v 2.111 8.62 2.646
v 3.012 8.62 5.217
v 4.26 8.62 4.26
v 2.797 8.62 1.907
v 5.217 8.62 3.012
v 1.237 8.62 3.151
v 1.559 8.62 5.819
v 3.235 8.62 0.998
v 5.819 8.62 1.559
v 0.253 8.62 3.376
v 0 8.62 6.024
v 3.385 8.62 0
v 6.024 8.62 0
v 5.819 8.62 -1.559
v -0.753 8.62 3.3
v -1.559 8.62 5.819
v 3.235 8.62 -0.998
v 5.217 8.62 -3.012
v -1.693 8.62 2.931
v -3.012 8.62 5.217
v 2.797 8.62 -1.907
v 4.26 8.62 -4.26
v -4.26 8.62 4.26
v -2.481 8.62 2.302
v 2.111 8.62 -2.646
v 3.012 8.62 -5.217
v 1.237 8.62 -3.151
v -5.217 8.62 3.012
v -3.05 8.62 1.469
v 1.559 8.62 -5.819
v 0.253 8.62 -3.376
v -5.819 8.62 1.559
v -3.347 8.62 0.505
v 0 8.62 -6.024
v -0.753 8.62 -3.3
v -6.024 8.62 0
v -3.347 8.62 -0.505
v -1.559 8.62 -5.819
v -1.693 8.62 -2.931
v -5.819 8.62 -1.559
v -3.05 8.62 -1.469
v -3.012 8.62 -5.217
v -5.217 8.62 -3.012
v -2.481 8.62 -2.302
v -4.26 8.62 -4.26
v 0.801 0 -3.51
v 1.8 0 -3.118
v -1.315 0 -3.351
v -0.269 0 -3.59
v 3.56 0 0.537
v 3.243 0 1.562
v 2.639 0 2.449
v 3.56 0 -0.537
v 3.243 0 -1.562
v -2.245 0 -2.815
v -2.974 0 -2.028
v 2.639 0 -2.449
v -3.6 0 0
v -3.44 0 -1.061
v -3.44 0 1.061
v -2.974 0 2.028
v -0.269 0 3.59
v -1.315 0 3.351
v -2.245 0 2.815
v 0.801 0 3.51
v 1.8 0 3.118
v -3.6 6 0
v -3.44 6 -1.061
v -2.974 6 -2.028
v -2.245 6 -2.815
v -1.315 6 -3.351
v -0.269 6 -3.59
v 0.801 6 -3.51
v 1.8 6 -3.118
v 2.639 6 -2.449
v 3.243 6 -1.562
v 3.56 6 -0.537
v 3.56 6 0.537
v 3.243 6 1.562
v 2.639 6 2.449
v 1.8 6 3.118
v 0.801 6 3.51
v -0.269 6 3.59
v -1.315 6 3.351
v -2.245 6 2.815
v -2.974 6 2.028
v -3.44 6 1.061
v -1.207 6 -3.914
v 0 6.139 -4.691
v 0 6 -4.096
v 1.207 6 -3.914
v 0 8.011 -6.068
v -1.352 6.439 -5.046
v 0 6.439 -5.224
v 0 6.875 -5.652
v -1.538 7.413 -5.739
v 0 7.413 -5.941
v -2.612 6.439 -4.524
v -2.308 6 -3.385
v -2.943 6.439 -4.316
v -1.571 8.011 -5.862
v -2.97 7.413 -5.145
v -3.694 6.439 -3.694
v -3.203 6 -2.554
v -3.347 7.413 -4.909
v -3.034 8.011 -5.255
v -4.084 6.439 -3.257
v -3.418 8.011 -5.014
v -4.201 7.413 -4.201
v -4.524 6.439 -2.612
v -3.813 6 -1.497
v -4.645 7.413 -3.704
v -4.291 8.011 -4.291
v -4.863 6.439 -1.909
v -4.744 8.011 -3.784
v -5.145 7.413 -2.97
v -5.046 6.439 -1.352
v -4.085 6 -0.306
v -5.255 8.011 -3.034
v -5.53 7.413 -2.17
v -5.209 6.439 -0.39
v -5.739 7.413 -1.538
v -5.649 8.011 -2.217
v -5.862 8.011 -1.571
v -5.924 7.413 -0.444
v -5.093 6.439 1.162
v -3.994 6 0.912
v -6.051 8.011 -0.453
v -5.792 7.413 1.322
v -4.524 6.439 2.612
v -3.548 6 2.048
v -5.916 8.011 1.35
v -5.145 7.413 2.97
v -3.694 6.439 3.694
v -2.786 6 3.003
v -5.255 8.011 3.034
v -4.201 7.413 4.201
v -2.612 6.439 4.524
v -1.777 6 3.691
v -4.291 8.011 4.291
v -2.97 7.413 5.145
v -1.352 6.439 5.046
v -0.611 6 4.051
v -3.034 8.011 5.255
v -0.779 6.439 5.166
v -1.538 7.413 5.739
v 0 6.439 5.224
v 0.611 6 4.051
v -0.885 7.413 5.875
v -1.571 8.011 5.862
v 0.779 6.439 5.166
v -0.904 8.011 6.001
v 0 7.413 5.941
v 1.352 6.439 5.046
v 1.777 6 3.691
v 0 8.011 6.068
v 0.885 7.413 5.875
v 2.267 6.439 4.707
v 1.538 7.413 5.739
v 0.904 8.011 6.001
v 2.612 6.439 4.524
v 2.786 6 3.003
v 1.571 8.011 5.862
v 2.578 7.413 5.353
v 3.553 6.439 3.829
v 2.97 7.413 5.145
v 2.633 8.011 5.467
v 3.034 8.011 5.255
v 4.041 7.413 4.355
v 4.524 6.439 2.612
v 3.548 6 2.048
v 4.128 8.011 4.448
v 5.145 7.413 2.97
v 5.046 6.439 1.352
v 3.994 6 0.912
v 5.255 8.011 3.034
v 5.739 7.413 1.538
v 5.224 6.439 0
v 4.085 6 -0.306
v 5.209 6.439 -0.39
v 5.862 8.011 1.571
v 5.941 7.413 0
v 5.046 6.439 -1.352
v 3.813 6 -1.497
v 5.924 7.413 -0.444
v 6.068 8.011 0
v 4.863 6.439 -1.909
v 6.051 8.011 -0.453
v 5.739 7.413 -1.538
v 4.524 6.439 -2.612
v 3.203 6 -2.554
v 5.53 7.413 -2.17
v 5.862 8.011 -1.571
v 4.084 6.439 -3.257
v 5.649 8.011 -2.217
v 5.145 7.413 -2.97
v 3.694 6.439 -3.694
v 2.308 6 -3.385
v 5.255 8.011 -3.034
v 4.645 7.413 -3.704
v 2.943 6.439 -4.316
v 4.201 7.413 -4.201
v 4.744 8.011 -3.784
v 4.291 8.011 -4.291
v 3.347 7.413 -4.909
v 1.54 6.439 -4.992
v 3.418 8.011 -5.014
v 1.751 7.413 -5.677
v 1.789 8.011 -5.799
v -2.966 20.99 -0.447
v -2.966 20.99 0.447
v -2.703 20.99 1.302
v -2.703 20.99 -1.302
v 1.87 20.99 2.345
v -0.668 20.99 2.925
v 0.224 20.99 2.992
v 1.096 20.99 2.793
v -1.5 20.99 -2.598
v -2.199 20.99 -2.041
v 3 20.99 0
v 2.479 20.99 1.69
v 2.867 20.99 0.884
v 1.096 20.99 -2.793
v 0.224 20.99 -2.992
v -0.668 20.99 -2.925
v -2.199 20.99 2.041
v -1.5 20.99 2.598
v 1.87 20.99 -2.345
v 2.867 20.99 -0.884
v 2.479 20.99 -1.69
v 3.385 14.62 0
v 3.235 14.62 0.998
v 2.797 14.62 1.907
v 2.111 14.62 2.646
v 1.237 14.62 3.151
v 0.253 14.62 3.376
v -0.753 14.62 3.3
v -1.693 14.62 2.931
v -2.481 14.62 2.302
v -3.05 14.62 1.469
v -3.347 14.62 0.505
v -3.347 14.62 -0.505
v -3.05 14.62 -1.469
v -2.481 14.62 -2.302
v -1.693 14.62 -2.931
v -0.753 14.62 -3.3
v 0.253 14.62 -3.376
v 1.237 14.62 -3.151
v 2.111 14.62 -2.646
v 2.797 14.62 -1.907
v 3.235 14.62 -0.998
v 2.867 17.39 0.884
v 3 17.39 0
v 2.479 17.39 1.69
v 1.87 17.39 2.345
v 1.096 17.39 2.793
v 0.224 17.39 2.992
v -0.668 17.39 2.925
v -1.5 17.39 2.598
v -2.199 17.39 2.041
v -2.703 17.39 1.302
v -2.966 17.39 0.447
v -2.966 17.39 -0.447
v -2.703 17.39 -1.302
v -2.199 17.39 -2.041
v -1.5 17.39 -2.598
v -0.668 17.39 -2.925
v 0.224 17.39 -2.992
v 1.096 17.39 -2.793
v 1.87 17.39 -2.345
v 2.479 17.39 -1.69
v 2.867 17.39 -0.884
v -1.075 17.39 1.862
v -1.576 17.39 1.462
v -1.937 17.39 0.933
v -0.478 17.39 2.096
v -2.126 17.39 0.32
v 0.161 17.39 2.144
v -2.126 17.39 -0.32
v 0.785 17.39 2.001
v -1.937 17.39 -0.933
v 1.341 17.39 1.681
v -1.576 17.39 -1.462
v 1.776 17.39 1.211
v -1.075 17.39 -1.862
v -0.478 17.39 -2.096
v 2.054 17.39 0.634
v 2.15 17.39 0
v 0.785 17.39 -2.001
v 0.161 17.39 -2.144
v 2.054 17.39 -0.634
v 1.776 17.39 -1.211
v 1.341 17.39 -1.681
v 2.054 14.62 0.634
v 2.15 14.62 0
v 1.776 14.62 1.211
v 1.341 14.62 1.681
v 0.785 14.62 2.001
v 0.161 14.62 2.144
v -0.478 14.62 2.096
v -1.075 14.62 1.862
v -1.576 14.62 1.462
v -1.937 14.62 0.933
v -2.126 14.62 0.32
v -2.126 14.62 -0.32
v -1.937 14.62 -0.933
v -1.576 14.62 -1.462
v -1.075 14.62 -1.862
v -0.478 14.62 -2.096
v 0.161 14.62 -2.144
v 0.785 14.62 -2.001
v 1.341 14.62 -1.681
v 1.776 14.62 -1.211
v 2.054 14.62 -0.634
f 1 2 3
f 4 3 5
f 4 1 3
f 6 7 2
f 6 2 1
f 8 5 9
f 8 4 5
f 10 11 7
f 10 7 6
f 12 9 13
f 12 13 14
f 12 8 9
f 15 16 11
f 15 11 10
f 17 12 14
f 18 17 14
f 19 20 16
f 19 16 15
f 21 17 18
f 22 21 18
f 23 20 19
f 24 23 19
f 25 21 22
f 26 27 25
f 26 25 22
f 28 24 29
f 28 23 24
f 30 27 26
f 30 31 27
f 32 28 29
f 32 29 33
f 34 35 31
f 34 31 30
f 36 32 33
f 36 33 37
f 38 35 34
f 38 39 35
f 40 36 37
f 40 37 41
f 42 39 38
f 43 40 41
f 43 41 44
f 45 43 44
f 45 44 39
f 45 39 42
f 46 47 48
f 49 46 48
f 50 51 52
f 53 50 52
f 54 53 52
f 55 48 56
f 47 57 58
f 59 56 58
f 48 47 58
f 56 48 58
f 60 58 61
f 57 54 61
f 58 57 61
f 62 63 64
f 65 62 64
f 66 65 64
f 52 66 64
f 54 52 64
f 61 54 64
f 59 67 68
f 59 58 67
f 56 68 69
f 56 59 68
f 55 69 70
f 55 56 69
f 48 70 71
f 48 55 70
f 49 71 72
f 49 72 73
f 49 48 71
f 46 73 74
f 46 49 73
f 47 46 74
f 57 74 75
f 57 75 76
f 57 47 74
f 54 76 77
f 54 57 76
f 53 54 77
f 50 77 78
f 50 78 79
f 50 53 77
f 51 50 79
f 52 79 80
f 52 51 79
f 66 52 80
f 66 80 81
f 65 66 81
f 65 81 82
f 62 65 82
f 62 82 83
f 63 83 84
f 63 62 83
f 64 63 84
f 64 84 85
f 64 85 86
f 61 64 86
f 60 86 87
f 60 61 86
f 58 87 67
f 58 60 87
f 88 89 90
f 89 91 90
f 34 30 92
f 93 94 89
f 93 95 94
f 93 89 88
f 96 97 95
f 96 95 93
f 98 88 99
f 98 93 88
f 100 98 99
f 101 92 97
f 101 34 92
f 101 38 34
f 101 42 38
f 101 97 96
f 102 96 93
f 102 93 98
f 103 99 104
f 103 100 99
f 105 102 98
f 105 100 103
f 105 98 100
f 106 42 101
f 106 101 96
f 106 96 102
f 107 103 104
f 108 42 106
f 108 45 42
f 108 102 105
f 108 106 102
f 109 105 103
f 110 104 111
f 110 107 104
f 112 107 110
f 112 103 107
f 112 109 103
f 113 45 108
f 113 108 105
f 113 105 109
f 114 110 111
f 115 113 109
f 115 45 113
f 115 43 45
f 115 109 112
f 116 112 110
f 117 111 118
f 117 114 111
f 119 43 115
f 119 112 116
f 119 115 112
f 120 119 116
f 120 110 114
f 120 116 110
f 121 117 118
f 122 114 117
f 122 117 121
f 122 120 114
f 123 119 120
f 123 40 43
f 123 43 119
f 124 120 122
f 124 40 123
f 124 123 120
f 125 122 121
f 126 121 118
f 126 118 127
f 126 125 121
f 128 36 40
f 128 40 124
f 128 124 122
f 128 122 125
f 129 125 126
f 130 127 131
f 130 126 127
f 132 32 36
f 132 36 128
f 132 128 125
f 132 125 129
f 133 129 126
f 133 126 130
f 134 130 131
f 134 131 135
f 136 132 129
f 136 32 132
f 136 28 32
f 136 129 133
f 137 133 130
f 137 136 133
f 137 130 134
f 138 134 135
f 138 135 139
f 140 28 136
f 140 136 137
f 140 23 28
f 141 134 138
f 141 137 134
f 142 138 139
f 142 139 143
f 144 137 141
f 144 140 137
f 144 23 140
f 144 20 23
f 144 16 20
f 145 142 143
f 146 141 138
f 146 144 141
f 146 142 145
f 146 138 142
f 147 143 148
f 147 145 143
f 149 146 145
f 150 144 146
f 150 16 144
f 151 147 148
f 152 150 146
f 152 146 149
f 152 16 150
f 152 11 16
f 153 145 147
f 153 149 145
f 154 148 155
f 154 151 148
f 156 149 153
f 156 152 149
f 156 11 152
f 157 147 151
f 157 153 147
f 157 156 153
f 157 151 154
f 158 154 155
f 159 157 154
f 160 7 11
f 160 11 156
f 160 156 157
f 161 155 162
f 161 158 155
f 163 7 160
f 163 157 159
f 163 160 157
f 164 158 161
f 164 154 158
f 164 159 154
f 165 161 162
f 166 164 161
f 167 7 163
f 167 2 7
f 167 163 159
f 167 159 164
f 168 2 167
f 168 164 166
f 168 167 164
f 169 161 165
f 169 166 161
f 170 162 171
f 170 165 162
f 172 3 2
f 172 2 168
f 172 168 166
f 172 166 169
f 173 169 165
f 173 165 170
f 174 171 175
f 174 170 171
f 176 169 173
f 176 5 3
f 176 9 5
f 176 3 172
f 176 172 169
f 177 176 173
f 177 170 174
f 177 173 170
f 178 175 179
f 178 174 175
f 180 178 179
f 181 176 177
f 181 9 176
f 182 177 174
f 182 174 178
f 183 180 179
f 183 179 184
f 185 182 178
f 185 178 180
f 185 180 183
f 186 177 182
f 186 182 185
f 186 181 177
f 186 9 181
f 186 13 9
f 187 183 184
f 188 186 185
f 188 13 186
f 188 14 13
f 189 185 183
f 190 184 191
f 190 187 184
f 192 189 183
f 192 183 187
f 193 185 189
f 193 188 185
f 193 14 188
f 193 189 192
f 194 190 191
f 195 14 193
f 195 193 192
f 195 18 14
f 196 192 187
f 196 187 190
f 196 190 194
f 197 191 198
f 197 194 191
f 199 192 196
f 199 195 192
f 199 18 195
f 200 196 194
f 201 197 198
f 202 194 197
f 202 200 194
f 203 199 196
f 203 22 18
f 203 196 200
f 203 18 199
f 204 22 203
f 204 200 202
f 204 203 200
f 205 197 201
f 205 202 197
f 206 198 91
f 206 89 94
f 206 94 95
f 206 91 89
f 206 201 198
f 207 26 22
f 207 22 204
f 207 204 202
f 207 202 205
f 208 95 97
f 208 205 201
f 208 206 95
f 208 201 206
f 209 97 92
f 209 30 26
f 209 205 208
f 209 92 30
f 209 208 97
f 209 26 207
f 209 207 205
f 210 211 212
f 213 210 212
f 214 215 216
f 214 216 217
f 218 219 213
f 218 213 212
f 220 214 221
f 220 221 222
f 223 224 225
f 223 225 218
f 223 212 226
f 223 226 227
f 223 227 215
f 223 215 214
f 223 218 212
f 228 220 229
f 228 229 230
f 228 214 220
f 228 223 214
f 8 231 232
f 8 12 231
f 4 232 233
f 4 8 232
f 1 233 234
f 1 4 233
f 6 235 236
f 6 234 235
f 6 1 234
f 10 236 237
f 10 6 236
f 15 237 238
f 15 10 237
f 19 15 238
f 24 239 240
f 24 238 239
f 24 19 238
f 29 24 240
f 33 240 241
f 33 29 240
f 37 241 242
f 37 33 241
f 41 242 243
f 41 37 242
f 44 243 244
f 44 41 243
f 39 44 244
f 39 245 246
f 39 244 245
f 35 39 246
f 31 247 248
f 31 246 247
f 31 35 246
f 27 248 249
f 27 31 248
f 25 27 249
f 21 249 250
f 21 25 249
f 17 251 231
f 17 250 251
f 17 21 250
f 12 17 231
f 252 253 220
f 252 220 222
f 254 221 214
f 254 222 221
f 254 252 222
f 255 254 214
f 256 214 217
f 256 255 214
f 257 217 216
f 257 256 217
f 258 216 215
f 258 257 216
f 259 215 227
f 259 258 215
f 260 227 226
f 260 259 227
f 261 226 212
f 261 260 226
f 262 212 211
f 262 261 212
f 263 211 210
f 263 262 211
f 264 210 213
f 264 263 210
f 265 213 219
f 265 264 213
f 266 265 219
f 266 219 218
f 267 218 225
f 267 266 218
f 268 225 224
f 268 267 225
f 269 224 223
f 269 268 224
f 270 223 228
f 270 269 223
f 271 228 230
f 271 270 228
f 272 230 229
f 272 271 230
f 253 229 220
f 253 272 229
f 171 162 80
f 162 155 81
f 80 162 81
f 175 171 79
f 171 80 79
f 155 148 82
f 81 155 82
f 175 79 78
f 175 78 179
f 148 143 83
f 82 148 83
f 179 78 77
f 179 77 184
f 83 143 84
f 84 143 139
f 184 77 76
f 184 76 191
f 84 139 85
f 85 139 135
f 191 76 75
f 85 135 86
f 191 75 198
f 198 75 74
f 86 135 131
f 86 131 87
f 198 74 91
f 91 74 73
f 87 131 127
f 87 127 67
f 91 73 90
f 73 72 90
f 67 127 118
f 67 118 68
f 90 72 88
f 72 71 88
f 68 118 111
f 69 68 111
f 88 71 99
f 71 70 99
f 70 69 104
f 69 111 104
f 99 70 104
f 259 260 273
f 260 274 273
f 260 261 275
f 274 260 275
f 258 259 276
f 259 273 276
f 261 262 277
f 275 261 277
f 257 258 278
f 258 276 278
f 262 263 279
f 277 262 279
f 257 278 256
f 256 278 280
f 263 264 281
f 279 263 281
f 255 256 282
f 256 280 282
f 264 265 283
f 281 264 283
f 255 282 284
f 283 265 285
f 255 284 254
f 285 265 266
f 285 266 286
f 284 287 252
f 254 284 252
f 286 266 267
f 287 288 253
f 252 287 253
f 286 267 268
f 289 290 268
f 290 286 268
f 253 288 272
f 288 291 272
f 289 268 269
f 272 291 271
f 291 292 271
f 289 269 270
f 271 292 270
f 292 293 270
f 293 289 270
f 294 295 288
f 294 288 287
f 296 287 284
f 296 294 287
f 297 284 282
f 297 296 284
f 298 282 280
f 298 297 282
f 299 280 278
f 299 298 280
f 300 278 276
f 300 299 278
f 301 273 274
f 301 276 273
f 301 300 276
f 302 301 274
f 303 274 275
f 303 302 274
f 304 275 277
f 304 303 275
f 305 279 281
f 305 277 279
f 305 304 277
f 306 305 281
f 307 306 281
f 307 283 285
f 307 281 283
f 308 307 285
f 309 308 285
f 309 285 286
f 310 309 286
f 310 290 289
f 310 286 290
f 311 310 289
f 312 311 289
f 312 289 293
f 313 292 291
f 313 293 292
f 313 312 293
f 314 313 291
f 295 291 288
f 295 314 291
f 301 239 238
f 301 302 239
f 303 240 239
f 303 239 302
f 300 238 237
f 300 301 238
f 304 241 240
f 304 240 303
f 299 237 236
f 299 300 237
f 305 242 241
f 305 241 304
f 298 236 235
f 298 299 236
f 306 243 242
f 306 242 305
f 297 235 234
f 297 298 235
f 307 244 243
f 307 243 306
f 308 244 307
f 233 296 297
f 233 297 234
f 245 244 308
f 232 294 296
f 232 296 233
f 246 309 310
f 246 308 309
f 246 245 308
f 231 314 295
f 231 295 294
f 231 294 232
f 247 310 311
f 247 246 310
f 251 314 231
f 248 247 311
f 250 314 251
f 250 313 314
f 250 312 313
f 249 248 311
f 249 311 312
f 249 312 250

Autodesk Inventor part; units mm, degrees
ref_plane "YZ Plane" through (0, 0, 0) normal (1, 0, 0) x (0, 1, 0)
ref_plane "XZ Plane" through (0, 0, 0) normal (0, 1, 0) x (-1, 0, 0)
ref_plane "XY Plane" through (0, 0, 0) normal (0, 0, 1) x (1, 0, 0)
sketch "Sketch1" plane through (0, 0, 0) normal (0, 1, 0) x (-1, 0, 0)
  circle A0 centre (0, 0) radius 3.6
  dimension "d0" = 7.2
extrude "Extrusion1" add sketch "Sketch1" along normal blind 6
sketch "Sketch2" plane through (0, 0, 0) normal (1, 0, 0) x (0, 1, 0)
  line L0 (6, -3.6) -> (6, 3.6) projected
  line L1 (6, 0) -> (8.6201, 0)
  line L2 (8.6201, 0) -> (8.6201, -6.024)
  line L3 (6, -3.6) -> (6, -4.0964)
  arc A0 (6, -4.0964) -> (8.6201, -6.024) centre (8.1594, -3.9057) ccw
  point P0 (0, 0)
revolve "Revolution1" add sketch "Sketch2" angle 360 about axis through (0, 6, 0) along (0, 1, 0)
sketch "Sketch3" plane through (0, 8.6201, 0) normal (0, 1, 0) x (1, 0, 0)
  circle A0 centre (0, 0) radius 3.385
  dimension "d4" = 6.77
extrude "Extrusion2" add sketch "Sketch3" along normal blind 6
sketch "Sketch4" plane through (0, 14.6201, 0) normal (0, 1, 0) x (1, 0, 0)
  circle A0 centre (0, 0) radius 2.15
  dimension "d7" = 4.3
extrude "Extrusion3" add sketch "Sketch4" along normal blind 2.77
sketch "Sketch5" plane through (0, 17.3901, 0) normal (0, 1, 0) x (1, 0, 0)
  circle A0 centre (0, 0) radius 3
  dimension "d10" = 6
extrude "Extrusion4" add sketch "Sketch5" along normal blind 3.6
thread "Thread1" size "M7x1" class "6g" standard "ANSI Metric M Profile" full length
properties part number "BLACKBUTTON"
